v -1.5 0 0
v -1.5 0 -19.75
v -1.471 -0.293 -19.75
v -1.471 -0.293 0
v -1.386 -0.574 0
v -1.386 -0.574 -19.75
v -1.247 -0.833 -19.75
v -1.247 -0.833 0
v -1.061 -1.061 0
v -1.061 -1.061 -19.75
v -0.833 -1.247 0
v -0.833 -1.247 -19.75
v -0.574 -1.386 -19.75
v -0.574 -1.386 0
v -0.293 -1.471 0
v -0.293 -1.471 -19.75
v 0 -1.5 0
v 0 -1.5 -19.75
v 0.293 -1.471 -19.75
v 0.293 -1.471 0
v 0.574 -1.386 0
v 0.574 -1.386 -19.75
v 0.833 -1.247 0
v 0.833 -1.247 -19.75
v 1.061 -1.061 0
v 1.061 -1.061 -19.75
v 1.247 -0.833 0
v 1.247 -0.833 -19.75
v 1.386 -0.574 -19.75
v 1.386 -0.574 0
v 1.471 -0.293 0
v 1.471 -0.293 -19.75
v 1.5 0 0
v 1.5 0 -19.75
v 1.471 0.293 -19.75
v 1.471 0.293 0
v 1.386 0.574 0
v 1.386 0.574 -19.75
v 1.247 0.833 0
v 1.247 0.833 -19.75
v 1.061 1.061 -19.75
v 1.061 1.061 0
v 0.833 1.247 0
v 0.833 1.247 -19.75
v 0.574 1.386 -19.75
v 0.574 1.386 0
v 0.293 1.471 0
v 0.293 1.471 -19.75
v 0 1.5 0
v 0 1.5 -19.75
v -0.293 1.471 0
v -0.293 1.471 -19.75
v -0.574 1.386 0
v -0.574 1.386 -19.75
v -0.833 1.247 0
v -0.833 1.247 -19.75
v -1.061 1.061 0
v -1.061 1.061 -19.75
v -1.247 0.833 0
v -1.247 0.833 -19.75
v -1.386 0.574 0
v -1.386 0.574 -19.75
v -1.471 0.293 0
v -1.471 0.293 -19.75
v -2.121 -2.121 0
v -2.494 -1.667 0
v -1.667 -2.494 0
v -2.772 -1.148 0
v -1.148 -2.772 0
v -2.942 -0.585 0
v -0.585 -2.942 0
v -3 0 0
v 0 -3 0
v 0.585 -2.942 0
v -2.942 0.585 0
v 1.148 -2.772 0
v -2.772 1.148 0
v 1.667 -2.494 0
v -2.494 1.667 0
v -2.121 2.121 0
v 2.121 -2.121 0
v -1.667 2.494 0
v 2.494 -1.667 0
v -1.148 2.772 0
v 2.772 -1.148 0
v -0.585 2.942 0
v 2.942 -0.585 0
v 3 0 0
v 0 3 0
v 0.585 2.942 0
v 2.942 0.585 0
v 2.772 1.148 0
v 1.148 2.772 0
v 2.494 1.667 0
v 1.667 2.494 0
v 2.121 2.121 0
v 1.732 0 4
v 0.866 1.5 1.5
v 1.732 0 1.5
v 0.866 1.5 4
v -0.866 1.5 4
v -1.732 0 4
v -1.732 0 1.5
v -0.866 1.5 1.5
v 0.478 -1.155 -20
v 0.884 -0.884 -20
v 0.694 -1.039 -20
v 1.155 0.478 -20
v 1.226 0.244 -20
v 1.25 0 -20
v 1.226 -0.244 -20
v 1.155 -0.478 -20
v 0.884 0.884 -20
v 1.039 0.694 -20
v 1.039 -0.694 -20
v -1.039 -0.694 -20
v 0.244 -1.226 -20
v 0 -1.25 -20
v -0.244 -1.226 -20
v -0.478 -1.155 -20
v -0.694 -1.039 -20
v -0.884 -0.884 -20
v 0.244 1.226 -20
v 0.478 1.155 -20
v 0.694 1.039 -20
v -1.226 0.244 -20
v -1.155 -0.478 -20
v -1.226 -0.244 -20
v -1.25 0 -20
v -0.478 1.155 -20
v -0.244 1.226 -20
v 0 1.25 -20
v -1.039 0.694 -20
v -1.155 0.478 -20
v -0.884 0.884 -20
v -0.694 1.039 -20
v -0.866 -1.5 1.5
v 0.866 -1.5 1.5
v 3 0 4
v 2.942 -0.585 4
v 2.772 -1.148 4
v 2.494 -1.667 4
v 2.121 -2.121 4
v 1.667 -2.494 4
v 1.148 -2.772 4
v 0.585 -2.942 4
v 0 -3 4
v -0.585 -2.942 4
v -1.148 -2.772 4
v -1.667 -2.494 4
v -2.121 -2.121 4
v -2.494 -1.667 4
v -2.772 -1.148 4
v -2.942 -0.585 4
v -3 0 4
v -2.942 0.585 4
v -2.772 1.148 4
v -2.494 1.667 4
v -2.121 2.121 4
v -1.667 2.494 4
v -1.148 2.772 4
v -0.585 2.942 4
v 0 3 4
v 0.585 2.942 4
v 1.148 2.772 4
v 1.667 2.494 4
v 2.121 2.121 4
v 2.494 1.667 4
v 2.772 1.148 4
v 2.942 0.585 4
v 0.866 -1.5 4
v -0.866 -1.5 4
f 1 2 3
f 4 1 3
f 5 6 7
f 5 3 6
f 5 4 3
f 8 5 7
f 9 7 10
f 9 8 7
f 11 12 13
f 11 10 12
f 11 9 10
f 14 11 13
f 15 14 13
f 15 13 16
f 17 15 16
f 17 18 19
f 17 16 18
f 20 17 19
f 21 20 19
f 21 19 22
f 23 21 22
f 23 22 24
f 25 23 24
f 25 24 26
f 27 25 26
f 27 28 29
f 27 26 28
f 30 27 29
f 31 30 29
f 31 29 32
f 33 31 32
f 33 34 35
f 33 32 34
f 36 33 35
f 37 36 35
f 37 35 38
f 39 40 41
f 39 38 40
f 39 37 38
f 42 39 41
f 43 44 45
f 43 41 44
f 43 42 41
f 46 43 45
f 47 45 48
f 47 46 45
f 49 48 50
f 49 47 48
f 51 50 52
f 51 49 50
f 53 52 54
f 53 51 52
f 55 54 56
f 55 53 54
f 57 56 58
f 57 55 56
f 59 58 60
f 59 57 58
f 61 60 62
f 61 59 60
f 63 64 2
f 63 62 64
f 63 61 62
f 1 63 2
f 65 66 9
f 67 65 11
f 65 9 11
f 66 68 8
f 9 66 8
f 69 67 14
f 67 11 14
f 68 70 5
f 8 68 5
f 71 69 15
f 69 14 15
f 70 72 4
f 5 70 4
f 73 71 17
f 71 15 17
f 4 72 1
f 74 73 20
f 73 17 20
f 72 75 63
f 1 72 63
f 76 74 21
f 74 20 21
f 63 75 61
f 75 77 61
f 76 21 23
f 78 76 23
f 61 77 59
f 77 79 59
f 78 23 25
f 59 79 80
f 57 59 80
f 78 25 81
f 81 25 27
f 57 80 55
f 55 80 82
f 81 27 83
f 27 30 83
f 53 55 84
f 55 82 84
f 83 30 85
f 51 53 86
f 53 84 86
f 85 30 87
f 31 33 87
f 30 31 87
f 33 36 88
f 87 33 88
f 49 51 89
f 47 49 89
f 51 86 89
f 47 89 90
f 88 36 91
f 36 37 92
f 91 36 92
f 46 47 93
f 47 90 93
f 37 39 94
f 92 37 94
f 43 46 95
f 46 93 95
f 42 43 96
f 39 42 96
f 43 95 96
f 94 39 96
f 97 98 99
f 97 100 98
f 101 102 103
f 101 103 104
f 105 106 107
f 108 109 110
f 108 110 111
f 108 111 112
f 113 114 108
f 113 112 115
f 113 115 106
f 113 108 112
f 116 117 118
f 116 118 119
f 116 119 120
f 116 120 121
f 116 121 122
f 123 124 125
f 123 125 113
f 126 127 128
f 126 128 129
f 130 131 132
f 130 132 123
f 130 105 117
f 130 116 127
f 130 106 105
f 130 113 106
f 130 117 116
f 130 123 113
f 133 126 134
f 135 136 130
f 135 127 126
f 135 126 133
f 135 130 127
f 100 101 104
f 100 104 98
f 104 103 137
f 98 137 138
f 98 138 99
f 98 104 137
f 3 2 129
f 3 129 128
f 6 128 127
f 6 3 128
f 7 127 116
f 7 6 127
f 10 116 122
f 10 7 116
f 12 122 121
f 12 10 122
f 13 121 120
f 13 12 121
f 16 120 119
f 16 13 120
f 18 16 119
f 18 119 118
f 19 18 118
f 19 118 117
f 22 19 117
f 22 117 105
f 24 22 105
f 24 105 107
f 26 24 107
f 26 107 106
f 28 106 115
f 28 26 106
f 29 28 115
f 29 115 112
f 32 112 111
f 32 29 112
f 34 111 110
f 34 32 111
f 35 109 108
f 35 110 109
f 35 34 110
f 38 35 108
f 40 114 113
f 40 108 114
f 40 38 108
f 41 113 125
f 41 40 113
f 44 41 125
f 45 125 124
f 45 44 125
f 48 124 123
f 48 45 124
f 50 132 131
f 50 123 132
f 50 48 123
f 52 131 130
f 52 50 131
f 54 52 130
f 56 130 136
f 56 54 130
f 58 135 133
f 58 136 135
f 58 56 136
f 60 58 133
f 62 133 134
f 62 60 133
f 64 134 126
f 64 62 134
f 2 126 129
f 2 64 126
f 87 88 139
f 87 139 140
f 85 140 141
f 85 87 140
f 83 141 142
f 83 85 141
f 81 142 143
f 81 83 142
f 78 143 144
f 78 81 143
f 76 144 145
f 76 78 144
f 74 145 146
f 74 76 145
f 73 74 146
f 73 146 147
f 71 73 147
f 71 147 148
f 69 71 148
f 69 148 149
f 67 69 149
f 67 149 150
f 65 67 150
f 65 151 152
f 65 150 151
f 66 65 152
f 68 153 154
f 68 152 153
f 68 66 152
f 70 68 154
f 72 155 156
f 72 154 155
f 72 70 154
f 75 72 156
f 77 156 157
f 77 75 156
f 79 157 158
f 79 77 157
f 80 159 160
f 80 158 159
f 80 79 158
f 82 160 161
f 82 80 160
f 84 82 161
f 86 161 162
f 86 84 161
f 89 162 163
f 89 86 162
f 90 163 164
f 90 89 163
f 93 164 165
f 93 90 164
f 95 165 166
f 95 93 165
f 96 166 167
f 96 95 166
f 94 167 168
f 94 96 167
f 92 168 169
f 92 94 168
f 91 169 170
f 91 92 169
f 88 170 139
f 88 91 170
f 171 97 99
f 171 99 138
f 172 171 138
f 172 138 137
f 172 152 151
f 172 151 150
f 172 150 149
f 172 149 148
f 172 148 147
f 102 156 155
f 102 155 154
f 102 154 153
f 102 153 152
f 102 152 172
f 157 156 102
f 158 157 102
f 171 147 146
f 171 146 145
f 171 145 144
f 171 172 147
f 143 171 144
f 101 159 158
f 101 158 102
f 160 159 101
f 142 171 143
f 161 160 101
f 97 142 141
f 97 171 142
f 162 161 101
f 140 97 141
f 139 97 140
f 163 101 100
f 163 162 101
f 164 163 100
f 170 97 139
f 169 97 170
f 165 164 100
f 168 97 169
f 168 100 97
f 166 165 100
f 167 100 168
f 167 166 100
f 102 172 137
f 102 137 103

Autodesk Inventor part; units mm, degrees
ref_plane "YZ Plane" through (0, 0, 0) normal (1, 0, 0) x (0, 1, 0)
ref_plane "XZ Plane" through (0, 0, 0) normal (0, 1, 0) x (-1, 0, 0)
ref_plane "XY Plane" through (0, 0, 0) normal (0, 0, 1) x (1, 0, 0)
sketch "草图1" plane through (0, 0, 0) normal (0, 0, 1) x (1, 0, 0)
  circle A0 centre (0, 0) radius 3
  dimension "d0" = 6
extrude "拉伸1" add sketch "草图1" along normal blind 4
sketch "草图2" plane through (0, 0, 4) normal (0, 0, 1) x (1, 0, 0)
  line L0 (0.866, -1.5) -> (-0.866, -1.5)
  line L1 (-0.866, -1.5) -> (-1.7321, 0)
  line L2 (-1.7321, 0) -> (-0.866, 1.5)
  line L3 (-0.866, 1.5) -> (0.866, 1.5)
  line L4 (0.866, 1.5) -> (1.7321, 0)
  line L5 (1.7321, 0) -> (0.866, -1.5)
  line L6 (0, 0) -> (0, 1.5)
  dimension "d3" = 3
extrude "拉伸2" cut sketch "草图2" against normal blind 2.5
sketch "草图3" plane through (0, 0, 0) normal (0, 0, -1) x (-1, 0, 0)
  circle A0 centre (0, 0) radius 1.5
  dimension "d6" = 3
extrude "拉伸3" add sketch "草图3" along normal blind 20
thread "螺纹1" size "M3x0.5" class "6g" standard "ANSI Metric M Profile" length 10
chamfer "倒角1" distance 0.25 angle 45 1 edges at (1.5, 0, -20)
properties part number "刀轴拨叉紧固螺丝"
